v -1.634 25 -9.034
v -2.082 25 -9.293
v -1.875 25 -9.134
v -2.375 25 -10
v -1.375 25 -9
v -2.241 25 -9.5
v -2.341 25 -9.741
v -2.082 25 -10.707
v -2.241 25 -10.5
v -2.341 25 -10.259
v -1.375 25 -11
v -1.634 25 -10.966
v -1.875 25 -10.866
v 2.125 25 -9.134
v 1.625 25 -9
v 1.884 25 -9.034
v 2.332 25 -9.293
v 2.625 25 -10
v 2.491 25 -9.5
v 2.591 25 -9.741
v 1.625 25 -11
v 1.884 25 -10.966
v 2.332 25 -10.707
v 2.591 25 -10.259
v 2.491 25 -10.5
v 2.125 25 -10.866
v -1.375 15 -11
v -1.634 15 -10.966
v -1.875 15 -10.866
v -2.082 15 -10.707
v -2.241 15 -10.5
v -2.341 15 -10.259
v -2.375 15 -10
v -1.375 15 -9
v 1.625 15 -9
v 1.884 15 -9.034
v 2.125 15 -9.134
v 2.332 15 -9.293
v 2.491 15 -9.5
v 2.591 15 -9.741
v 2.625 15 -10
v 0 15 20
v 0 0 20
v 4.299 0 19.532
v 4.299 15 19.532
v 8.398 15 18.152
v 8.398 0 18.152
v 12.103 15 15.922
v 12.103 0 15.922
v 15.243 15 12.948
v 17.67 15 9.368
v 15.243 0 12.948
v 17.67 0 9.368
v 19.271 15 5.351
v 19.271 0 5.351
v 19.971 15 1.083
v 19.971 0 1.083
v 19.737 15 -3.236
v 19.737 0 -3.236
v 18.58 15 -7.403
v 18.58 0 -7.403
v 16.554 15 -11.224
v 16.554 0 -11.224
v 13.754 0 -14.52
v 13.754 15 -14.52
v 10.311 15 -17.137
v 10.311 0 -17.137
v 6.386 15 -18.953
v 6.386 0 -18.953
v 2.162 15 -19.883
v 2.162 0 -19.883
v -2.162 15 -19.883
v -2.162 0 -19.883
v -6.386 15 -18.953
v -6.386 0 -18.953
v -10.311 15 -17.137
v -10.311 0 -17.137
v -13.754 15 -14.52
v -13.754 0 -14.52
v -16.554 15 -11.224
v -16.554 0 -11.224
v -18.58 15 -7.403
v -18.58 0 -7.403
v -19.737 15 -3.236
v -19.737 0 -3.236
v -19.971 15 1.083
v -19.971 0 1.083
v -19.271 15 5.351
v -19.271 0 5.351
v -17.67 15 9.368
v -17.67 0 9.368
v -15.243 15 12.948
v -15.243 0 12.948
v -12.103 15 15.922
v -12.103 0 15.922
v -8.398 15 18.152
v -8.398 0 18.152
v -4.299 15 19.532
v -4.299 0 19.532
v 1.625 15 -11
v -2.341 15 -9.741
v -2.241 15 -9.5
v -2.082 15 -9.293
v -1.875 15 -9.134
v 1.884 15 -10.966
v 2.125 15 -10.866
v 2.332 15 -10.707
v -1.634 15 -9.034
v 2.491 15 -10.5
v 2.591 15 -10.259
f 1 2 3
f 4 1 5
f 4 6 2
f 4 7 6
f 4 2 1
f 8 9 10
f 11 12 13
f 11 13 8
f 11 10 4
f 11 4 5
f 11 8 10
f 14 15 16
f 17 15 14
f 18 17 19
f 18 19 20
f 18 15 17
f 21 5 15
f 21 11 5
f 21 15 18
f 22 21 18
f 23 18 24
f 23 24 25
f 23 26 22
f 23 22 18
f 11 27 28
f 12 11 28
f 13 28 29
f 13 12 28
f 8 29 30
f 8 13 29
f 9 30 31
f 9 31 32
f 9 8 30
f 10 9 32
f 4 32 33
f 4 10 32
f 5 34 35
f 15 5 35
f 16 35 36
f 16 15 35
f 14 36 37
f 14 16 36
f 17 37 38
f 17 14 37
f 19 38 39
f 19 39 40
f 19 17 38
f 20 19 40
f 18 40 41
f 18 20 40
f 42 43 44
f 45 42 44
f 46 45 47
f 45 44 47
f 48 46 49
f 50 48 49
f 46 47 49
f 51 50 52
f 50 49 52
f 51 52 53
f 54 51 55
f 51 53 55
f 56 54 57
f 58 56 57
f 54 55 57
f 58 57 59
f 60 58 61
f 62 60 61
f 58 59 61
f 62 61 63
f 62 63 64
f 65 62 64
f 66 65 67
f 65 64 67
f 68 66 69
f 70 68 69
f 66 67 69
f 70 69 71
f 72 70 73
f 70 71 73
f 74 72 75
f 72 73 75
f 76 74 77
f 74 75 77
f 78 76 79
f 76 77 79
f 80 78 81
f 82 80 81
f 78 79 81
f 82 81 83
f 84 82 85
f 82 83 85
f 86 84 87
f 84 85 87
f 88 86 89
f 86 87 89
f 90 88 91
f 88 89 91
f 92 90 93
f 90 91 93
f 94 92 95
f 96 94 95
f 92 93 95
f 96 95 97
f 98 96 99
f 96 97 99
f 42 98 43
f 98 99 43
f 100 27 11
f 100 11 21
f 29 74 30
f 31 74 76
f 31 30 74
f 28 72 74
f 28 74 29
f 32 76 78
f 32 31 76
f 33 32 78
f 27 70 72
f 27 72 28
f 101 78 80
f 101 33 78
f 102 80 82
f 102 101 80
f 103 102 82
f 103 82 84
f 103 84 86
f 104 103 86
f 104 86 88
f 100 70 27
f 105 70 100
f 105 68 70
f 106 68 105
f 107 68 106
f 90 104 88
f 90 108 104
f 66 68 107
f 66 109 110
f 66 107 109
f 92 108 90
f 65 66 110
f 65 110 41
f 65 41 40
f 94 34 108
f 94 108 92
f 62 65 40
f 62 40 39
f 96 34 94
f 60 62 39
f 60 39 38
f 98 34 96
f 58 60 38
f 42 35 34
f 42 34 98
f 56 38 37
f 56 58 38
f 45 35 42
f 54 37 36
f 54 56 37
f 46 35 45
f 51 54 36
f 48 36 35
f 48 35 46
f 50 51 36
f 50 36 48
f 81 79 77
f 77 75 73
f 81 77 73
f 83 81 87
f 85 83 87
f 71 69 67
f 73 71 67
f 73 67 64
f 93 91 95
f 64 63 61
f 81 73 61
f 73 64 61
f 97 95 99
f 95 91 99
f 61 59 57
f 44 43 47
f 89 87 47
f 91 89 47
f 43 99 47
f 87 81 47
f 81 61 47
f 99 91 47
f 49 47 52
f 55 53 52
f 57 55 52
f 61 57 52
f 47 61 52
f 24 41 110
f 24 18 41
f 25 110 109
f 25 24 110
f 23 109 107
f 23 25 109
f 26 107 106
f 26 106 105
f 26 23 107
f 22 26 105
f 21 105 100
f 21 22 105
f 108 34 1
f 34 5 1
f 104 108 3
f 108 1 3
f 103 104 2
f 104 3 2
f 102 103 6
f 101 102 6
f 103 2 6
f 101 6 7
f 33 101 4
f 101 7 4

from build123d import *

# Parameters (mm, degrees)
SKETCH1_R           = 20
BOSS_EXTRUDE1_DEPTH = 15
SKETCH2_W           = 5
SKETCH2_H           = 2
BOSS_EXTRUDE2_DEPTH = 10
FILLET1_R           = 1


with BuildPart() as part:
    # Sketch1 → Boss-Extrude1 (new body)
    with BuildSketch(Plane(origin=(0, 0, 0), x_dir=(1, 0, 0), z_dir=(0, 1, 0))):
        with Locations(Location((0, 0, 0), (0, 0, 270))):
            Circle(SKETCH1_R)
    extrude(amount=BOSS_EXTRUDE1_DEPTH)

    # Sketch2 → Boss-Extrude2 (add)
    with BuildSketch(Plane(origin=(0, 15, 0), x_dir=(1, 0, 0), z_dir=(0, 1, 0))):
        with Locations((0.125263177, 10)):
            Rectangle(SKETCH2_W, SKETCH2_H)
    extrude(amount=BOSS_EXTRUDE2_DEPTH)

    # Fillet1
    fillet1_edges = [part.edges().sort_by_distance(p)[0] for p in [
        (-2.374736823, 20, -11),
        (2.625263177, 20, -11),
        (-2.374736823, 20, -9),
        (2.625263177, 20, -9),
    ]]
    fillet(fillet1_edges, radius=FILLET1_R - 0.0001)  # a hair under: the kernel refuses the full size


solid = part.part
